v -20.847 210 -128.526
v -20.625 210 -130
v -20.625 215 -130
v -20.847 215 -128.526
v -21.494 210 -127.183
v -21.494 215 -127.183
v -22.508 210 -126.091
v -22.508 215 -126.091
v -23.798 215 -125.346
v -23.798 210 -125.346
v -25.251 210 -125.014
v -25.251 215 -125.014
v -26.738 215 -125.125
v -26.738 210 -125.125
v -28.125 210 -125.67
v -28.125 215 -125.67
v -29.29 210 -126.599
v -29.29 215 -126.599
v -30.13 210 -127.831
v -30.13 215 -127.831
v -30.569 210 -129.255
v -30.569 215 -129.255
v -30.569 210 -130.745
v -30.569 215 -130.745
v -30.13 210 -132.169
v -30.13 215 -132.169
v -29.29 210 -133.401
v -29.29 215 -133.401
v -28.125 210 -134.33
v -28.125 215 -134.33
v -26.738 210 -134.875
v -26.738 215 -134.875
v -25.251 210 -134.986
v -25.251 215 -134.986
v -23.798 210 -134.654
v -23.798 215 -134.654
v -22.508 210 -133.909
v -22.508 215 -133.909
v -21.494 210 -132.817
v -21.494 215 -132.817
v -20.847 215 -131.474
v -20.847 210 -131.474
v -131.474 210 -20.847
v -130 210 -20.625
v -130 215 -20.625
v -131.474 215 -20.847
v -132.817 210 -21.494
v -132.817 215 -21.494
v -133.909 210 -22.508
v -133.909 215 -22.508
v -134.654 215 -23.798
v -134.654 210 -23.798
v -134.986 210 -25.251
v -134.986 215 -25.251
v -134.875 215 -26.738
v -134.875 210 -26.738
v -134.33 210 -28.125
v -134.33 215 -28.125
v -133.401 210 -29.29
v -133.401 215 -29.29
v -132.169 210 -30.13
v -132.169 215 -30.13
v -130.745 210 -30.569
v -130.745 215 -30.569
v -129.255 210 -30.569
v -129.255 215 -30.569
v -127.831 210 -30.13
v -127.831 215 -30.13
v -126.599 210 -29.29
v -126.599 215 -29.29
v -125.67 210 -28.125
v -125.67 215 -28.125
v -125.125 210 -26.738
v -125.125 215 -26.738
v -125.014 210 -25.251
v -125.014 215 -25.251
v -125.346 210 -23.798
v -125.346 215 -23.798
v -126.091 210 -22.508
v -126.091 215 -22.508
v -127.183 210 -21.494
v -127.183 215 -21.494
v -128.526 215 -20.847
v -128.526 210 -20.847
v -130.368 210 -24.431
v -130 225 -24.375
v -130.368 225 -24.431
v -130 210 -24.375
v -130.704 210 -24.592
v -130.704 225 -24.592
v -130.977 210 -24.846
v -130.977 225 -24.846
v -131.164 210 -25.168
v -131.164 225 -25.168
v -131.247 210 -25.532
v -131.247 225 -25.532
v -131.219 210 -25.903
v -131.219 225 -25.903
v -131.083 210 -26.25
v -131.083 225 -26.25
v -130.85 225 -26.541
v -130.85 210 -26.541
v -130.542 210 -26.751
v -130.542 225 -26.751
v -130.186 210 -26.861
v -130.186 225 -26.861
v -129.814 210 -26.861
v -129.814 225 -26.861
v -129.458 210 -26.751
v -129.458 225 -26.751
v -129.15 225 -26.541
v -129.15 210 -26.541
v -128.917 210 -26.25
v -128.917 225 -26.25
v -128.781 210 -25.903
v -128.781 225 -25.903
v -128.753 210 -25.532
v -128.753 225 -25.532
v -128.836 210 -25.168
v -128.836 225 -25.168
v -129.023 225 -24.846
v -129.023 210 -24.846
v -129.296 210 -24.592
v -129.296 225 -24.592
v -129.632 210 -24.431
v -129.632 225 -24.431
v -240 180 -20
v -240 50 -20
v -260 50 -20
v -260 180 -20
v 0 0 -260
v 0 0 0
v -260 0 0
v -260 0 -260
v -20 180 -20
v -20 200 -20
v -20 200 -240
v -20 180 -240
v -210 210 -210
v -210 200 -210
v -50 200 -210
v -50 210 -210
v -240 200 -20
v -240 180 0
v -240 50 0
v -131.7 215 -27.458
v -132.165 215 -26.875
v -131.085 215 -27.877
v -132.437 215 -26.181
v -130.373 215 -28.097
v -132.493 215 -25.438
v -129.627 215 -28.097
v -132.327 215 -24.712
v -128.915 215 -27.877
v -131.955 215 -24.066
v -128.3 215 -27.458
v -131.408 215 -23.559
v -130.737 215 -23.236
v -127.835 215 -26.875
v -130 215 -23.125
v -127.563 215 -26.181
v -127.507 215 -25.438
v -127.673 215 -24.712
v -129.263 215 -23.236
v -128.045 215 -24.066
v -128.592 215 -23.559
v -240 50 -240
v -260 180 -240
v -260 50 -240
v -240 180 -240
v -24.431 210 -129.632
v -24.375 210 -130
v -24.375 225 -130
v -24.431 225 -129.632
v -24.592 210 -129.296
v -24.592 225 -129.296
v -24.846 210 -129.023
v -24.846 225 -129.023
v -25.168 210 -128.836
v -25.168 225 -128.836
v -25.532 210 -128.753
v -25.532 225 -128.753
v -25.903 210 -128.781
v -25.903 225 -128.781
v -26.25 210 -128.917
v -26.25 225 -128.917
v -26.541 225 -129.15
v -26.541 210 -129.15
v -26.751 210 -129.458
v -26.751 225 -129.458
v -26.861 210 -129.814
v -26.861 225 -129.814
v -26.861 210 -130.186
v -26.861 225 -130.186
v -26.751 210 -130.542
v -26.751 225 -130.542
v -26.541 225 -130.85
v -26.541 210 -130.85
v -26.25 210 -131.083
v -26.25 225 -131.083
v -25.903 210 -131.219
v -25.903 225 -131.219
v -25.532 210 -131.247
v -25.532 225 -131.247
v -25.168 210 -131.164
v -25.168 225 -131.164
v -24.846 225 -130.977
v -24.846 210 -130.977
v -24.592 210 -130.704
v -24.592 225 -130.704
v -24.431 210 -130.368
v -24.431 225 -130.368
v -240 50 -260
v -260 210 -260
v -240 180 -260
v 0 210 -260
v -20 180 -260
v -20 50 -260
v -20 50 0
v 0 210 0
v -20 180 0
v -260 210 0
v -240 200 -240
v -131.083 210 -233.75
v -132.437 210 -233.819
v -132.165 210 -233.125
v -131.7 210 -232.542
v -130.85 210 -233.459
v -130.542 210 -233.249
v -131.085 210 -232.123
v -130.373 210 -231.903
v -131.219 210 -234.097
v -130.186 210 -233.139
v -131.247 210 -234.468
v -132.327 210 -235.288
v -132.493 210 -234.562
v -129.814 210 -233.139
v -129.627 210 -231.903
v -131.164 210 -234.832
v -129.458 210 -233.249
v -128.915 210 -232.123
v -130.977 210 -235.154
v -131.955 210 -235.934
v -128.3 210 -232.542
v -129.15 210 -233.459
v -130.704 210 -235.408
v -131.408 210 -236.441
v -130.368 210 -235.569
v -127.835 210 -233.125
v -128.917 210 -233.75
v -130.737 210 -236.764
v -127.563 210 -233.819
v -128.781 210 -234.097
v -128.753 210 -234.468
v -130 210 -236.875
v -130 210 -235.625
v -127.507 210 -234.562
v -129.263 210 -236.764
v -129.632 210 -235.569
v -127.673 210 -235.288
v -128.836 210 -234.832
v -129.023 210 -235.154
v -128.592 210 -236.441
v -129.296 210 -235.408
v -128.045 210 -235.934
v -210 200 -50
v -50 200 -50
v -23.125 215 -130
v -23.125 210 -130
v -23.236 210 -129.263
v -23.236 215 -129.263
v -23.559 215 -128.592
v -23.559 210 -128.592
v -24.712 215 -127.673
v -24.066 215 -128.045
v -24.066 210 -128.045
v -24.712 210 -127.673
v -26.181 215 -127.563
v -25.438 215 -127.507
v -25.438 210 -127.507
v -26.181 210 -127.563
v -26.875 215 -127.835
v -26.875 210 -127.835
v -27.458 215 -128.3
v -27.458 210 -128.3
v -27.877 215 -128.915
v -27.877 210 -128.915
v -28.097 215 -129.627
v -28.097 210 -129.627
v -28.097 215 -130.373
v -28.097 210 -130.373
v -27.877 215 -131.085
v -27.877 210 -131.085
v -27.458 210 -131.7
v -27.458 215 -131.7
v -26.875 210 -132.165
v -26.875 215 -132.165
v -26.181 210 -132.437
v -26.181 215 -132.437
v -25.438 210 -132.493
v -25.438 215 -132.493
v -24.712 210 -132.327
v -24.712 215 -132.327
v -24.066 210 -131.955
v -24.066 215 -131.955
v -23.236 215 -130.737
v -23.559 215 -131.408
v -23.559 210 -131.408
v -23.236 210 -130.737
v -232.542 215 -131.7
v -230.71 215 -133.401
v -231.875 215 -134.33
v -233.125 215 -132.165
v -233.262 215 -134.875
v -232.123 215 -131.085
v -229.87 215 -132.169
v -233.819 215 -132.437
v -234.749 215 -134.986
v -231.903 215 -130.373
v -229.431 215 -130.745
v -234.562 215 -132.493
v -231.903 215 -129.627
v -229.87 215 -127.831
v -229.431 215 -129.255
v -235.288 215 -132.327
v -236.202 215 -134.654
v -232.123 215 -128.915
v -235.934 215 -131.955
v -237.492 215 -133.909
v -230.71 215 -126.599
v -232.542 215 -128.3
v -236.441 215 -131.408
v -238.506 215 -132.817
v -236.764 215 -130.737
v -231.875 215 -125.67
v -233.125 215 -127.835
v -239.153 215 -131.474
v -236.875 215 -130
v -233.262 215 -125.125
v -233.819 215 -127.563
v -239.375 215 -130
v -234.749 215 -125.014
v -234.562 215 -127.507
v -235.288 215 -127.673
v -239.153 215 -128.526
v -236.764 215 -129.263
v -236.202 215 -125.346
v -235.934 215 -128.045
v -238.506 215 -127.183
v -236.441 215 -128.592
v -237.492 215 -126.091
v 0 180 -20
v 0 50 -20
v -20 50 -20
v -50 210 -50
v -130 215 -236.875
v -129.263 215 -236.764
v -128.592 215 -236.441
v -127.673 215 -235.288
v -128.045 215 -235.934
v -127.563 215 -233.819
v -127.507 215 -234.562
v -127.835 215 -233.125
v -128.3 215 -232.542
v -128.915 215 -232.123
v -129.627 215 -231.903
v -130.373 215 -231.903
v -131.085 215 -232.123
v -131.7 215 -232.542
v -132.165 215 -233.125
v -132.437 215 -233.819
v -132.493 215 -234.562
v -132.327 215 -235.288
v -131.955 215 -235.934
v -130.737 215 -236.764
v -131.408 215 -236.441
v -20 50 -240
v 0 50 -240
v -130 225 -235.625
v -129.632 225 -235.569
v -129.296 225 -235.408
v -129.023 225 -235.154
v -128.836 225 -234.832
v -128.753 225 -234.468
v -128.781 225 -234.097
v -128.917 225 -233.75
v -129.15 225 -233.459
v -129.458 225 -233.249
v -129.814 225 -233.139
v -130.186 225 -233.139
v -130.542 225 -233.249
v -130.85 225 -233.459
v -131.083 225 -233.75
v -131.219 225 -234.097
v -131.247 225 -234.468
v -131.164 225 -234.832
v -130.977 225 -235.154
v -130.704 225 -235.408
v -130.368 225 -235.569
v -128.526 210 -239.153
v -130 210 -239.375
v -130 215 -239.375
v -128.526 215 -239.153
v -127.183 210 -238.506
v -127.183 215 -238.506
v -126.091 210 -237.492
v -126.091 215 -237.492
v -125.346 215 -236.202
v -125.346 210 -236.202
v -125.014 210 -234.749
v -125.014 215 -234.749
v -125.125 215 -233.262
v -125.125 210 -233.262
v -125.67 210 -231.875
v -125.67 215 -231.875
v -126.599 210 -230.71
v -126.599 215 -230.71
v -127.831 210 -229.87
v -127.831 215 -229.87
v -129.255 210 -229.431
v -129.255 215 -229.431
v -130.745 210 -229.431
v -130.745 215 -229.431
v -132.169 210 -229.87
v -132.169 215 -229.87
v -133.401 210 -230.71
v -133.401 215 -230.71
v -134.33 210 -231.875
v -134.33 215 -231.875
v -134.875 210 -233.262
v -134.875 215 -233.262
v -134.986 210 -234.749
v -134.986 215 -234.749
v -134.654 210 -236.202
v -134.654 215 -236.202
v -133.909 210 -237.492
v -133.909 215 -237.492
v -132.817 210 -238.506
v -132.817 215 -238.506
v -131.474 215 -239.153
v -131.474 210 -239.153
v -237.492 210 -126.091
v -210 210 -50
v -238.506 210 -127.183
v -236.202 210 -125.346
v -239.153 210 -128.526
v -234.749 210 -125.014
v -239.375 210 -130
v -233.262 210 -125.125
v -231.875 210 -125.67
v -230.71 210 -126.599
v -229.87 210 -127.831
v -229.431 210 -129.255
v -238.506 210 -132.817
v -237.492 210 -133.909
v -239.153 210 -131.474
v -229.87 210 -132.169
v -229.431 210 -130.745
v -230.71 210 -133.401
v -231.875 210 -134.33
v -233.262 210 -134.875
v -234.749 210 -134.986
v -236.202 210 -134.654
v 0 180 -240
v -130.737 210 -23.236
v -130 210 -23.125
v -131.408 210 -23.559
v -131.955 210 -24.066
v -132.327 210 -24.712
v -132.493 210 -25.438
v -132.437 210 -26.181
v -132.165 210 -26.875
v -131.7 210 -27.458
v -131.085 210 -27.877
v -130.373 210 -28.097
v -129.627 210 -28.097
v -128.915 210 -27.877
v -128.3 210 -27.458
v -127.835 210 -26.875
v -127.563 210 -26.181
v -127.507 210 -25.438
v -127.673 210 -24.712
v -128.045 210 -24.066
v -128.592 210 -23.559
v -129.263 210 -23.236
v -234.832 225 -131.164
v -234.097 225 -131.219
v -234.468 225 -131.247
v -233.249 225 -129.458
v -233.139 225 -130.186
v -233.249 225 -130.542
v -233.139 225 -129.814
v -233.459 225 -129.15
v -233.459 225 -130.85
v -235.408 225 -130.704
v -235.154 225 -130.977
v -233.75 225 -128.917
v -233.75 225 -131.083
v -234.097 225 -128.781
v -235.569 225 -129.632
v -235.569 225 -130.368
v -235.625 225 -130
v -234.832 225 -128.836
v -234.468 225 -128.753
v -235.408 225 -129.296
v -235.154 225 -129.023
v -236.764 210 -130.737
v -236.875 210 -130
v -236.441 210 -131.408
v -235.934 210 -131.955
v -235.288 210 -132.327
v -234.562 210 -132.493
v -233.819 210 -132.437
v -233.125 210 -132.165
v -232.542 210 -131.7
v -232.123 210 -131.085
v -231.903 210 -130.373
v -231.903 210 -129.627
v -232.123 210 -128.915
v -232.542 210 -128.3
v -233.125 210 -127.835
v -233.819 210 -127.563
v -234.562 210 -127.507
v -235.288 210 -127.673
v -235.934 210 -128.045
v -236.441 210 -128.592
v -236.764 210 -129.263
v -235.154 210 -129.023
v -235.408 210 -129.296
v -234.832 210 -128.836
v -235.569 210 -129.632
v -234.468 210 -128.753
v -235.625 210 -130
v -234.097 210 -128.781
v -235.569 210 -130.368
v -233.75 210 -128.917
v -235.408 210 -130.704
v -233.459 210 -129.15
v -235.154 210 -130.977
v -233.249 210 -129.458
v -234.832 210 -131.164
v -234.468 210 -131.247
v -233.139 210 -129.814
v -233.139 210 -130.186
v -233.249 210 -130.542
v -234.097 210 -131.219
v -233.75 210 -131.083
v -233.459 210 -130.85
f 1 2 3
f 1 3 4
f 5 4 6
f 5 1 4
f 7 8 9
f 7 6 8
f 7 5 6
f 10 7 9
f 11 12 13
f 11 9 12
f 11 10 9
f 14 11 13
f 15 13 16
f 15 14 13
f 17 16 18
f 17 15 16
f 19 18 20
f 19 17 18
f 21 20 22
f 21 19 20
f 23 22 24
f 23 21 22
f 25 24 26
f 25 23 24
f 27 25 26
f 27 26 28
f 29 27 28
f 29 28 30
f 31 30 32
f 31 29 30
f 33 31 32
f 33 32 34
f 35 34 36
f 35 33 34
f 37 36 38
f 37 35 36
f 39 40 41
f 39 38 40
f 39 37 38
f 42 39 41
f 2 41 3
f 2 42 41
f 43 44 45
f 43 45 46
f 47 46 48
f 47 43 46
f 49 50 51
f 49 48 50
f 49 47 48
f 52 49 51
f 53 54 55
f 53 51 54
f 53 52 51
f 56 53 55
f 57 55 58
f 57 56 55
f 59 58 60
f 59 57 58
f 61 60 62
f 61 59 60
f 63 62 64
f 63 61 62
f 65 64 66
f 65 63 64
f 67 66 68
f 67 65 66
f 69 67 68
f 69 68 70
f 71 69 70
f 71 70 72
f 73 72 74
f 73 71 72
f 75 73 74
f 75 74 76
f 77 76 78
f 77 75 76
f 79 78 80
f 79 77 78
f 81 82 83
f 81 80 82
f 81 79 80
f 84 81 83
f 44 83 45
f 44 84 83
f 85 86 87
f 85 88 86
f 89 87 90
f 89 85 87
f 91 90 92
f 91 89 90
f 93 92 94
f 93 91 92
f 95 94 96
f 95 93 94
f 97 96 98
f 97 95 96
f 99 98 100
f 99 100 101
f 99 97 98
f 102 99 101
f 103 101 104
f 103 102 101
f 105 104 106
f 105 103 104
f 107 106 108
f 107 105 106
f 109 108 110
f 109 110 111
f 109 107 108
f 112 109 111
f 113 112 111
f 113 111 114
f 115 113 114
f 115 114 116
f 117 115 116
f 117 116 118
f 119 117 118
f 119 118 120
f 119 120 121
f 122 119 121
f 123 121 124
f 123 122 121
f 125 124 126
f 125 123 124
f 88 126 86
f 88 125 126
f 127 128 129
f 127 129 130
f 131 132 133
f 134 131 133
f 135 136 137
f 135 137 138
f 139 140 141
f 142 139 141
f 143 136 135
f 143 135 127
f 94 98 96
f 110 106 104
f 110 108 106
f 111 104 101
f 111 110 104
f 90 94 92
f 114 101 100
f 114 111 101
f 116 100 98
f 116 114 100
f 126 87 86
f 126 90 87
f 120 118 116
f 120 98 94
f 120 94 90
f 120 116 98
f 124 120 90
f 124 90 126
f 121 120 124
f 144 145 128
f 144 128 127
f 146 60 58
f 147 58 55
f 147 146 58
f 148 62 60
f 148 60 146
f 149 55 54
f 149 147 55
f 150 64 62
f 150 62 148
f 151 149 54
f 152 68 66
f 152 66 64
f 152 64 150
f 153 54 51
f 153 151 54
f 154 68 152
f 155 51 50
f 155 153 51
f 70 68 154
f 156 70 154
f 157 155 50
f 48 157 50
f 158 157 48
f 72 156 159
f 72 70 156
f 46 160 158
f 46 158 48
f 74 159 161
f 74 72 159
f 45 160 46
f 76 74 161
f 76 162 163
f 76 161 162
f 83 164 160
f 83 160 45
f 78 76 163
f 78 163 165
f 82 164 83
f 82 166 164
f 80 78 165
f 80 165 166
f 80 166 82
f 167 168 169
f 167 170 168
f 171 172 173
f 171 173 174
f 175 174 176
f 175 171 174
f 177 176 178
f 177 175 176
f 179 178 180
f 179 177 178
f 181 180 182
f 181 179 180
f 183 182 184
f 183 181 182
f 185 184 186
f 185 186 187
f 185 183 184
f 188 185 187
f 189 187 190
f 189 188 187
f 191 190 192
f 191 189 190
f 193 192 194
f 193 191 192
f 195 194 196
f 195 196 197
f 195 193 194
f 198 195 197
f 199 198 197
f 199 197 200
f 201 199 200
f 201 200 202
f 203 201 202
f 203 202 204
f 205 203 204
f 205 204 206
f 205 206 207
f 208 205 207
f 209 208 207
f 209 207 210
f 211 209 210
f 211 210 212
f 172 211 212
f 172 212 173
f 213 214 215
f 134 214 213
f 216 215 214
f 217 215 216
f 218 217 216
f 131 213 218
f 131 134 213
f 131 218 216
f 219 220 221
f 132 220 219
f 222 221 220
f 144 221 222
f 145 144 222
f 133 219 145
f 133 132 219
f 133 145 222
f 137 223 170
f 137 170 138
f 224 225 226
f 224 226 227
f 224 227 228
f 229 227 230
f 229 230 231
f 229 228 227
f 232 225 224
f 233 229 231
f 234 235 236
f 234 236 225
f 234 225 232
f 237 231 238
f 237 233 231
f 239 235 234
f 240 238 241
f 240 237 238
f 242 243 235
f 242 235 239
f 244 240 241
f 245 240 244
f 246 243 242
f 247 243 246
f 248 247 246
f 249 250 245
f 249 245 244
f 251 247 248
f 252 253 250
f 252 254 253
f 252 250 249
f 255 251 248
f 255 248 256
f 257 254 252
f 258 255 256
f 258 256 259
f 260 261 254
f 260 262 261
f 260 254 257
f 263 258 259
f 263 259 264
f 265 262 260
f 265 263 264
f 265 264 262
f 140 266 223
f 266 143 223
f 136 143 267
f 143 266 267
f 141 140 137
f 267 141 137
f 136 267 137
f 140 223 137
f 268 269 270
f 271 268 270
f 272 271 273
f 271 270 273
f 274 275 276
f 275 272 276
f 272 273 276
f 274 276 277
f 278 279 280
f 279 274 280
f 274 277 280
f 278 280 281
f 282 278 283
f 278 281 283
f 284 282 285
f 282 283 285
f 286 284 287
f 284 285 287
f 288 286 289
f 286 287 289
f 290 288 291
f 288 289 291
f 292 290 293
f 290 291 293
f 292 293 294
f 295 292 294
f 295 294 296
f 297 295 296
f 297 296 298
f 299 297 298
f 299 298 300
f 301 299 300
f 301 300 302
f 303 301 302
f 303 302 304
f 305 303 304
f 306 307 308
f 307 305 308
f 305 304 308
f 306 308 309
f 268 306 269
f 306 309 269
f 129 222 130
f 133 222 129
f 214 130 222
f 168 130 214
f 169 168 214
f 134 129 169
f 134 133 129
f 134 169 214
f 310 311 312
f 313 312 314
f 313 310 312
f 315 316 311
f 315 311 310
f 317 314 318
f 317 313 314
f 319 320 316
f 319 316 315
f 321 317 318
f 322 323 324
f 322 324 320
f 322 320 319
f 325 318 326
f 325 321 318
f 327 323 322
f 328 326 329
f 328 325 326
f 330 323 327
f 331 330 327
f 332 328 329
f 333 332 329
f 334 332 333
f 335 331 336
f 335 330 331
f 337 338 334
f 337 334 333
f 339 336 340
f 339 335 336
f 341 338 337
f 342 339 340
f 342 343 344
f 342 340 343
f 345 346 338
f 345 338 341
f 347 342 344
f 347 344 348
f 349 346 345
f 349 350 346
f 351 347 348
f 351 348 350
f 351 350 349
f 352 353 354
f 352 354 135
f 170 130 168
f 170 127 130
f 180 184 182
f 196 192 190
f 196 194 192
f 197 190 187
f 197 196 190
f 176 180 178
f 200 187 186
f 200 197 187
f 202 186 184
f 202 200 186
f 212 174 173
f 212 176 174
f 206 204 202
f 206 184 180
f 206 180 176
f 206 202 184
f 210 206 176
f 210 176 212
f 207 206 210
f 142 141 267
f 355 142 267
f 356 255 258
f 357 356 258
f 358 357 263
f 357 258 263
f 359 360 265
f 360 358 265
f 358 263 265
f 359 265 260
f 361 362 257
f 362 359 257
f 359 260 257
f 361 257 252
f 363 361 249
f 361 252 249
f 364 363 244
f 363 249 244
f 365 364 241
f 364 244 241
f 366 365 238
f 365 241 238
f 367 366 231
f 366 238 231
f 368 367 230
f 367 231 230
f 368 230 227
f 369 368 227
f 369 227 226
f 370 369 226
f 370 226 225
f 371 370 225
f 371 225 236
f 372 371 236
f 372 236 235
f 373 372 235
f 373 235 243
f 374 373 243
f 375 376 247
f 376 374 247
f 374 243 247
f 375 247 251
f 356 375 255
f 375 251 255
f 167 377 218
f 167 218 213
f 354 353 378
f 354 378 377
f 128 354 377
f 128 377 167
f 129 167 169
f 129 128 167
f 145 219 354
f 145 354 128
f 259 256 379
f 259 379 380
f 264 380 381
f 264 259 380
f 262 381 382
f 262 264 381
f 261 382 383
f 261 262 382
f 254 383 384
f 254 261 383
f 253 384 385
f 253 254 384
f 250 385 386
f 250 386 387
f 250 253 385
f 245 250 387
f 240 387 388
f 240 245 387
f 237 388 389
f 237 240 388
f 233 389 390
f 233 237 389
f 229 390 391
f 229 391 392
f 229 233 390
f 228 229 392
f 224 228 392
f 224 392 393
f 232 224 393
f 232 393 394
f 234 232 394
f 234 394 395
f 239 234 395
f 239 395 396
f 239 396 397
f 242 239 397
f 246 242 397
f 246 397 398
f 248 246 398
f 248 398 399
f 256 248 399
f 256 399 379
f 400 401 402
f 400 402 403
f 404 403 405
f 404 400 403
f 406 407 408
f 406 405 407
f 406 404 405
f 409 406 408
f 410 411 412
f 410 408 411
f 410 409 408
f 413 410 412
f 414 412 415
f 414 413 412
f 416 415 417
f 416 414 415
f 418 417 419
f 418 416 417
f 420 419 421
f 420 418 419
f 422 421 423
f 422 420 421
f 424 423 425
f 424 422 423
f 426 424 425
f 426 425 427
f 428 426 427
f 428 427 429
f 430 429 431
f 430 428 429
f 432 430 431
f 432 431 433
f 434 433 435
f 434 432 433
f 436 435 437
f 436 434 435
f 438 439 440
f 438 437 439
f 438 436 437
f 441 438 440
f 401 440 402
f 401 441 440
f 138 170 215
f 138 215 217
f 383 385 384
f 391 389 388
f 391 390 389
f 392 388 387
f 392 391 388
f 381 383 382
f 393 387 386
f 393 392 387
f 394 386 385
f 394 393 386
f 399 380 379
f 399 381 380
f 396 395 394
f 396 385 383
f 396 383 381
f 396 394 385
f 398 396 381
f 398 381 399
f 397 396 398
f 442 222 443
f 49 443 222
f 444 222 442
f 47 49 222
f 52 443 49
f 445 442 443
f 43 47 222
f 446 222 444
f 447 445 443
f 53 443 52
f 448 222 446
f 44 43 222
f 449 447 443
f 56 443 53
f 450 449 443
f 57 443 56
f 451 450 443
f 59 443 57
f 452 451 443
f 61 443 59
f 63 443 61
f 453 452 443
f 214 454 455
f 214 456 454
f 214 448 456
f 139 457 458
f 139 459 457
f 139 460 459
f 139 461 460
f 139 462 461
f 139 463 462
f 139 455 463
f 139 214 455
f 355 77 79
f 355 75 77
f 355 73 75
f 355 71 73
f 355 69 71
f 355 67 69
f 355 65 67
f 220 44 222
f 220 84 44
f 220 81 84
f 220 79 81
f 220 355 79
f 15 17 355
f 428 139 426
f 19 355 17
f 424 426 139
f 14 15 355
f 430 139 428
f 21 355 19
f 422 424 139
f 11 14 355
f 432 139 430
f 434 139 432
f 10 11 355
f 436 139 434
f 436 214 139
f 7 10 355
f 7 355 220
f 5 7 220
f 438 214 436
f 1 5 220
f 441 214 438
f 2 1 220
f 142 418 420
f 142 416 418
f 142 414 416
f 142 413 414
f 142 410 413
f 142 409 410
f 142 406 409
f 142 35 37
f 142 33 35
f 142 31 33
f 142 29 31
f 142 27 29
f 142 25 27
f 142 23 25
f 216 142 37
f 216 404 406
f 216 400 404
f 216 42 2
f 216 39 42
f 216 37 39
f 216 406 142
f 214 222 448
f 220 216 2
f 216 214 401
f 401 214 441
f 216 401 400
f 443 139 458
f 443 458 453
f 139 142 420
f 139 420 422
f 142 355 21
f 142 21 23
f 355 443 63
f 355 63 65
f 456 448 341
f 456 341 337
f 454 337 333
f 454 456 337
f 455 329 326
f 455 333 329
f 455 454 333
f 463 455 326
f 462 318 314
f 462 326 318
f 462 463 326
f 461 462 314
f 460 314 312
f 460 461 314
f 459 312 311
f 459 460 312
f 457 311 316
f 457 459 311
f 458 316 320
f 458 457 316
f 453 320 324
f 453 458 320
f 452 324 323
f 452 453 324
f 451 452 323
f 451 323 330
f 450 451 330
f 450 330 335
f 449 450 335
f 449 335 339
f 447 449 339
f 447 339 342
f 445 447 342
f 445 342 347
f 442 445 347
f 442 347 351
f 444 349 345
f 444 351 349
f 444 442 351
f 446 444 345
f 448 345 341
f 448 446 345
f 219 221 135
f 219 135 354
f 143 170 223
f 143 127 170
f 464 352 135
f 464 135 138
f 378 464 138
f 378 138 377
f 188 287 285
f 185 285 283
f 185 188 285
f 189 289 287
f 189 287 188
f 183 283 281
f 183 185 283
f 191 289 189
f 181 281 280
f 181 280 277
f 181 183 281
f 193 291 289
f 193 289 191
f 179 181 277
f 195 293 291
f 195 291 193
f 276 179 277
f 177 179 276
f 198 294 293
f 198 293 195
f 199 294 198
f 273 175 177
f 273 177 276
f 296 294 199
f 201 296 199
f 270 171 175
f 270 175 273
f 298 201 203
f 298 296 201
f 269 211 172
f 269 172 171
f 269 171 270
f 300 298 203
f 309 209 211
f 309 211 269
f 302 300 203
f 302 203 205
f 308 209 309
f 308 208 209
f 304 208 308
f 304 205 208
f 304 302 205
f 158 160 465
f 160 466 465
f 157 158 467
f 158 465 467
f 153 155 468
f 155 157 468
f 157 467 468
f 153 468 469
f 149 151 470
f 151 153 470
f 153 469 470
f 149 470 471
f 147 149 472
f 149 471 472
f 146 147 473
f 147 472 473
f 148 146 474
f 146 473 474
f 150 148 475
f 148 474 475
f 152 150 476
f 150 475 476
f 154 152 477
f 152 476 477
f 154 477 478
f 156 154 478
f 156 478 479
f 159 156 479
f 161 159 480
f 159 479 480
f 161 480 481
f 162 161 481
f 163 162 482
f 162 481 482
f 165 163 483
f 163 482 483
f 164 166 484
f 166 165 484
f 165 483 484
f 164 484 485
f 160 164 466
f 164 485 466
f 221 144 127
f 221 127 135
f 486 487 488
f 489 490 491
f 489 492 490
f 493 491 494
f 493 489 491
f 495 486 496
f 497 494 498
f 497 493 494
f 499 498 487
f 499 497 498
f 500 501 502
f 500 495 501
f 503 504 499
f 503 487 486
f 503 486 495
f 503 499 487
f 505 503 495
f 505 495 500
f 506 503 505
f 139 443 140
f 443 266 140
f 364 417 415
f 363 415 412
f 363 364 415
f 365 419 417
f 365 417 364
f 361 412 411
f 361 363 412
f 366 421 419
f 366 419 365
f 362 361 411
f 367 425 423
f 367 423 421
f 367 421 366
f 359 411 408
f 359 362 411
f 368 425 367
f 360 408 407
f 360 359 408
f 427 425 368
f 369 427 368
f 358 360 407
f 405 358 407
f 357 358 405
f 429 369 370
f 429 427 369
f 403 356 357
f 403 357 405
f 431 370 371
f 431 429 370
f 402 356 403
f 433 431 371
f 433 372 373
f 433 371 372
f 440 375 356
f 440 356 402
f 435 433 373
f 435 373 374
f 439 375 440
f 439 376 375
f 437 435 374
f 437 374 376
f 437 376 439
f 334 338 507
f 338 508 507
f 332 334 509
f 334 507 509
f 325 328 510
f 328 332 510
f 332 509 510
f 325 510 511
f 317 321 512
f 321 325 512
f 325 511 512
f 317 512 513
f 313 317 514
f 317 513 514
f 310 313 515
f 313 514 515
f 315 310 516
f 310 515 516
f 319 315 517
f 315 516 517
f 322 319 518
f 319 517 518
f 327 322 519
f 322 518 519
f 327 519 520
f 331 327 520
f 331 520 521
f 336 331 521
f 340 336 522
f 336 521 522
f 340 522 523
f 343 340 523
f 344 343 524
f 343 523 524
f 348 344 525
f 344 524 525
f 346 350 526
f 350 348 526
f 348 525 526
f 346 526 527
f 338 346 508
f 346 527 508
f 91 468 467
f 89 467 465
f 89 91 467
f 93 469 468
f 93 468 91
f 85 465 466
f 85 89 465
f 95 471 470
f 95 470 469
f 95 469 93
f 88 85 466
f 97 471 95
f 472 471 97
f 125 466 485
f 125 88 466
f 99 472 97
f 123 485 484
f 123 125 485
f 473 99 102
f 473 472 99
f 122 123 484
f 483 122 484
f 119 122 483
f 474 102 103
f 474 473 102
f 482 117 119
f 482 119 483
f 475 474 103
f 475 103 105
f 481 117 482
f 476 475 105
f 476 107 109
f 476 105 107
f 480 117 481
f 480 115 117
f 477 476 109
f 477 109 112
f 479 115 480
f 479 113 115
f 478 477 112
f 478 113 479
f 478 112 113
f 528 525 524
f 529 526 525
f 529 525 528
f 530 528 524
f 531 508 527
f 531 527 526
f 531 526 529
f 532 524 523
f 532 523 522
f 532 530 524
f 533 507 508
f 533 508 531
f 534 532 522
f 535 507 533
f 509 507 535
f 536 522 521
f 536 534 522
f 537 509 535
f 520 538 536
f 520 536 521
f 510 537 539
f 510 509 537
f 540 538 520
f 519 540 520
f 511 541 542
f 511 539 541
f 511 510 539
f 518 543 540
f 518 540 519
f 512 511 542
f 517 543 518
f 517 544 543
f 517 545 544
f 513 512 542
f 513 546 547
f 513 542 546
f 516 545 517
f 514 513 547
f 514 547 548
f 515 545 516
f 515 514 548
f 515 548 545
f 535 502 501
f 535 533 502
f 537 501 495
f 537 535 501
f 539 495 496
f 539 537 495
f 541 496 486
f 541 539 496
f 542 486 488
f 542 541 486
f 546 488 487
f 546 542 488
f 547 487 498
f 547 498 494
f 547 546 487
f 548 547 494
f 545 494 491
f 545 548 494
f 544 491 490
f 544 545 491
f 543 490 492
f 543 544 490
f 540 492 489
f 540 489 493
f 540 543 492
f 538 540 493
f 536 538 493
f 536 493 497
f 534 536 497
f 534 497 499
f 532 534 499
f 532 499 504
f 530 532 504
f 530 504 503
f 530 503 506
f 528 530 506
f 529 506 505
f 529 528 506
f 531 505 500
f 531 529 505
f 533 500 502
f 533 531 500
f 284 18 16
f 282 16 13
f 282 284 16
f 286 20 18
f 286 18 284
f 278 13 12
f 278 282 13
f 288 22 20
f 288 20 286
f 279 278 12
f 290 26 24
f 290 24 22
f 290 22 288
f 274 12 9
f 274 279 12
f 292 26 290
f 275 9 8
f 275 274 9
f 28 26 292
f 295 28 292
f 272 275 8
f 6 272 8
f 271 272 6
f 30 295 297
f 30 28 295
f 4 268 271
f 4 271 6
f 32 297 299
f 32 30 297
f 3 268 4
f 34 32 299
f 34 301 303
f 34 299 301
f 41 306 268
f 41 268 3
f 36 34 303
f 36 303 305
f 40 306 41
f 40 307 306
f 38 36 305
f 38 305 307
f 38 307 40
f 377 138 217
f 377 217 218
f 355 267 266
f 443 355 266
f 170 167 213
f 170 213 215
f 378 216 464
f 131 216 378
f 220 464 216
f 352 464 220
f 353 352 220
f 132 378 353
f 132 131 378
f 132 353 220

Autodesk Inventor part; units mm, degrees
ref_plane "YZ Plane" through (0, 0, 0) normal (1, 0, 0) x (0, 1, 0)
ref_plane "XZ Plane" through (0, 0, 0) normal (0, 1, 0) x (-1, 0, 0)
sketch "Sketch1" plane through (0, 0, 0) normal (0, 1, 0) x (-1, 0, 0)
  line L0 (0, 0) -> (260, 0)
  line L1 (260, 0) -> (260, -260)
  line L2 (260, -260) -> (0, -260)
  line L3 (0, -260) -> (0, 0)
  dimension "d0" = 260
  dimension "d1" = 260
extrude "Extrusion1" add sketch "Sketch1" along normal blind 200
sketch "Sketch2" plane through (0, 200, 0) normal (0, 1, 0) x (1, 0, 0)
  line L0 (-260, 0) -> (0, 0) projected
  line L1 (0, 0) -> (-20, 0)
  line L2 (-20, 0) -> (-20, 20)
  line L3 (-20, 20) -> (0, 20)
  line L4 (0, 20) -> (0, 0)
  line L5 (-260, 260) -> (-260, 0) projected
  line L6 (-260, 260) -> (-240, 260)
  line L7 (-240, 260) -> (-240, 240)
  line L8 (-240, 240) -> (-260, 240)
  line L9 (-260, 240) -> (-260, 260)
  line L10 (-240, 240) -> (-20, 240)
  line L11 (-20, 240) -> (-20, 20)
  line L12 (-20, 20) -> (-240, 20)
  line L13 (-240, 20) -> (-240, 240)
  dimension "d4" = 20
  dimension "d5" = 20
  dimension "d6" = 20
  dimension "d7" = 20
sketch "Sketch3" plane through (-260, 0, 0) normal (0, 0, 1) x (1, 0, 0)
  line L0 (260, 200) -> (0, 200) projected
  line L1 (0, 200) -> (20, 200)
  line L2 (20, 200) -> (20, 180)
  line L3 (20, 180) -> (0, 180)
  line L4 (0, 180) -> (0, 200)
  line L5 (260, 0) -> (240, 0)
  line L6 (240, 0) -> (240, 50)
  line L7 (240, 50) -> (260, 50)
  line L8 (260, 50) -> (260, 0)
  line L9 (20, 180) -> (240, 180)
  line L10 (240, 180) -> (240, 50)
  line L11 (240, 50) -> (20, 50)
  line L12 (20, 50) -> (20, 180)
  dimension "d8" = 20
  dimension "d9" = 20
  dimension "d10" = 20
  dimension "d11" = 50
extrude "Extrusion2" cut sketch "Sketch2" against normal blind 150 contours L12 L13 L10 L11
extrude "Extrusion3" cut sketch "Sketch3" against normal blind 260 contours L9 L10 L11 L12
ref_plane "Work Plane1" through (0, 0, -130) normal (0, 0, 1) x (1, 0, 0)
sketch "Sketch4" plane through (0, 0, 0) normal (1, 0, 0) x (0, 0, -1)
  line L0 (260, 200) -> (0, 200)
  line L1 (0, 200) -> (20, 200)
  line L2 (20, 200) -> (20, 180)
  line L3 (20, 180) -> (0, 180)
  line L4 (0, 180) -> (0, 200)
  line L5 (260, 0) -> (240, 0)
  line L6 (240, 0) -> (240, 50)
  line L7 (240, 50) -> (260, 50)
  line L8 (260, 50) -> (260, 0)
  line L9 (20, 180) -> (240, 180)
  line L10 (240, 180) -> (240, 50)
  line L11 (240, 50) -> (20, 50)
  line L12 (20, 50) -> (20, 180)
  point P0 (0, 0)
  dimension "d17" = 20
  dimension "d18" = 20
  dimension "d19" = 20
  dimension "d20" = 50
extrude "Extrusion4" cut sketch "Sketch4" against normal blind 260 contours L9 L10 L11 L12
sketch "Sketch5" plane through (0, 200, 0) normal (0, 1, 0) x (1, 0, 0)
  line L0 (-260, 0) -> (0, 0) projected
  line L1 (-260, 260) -> (0, 260)
  line L2 (0, 260) -> (0, 0)
  line L3 (0, 0) -> (-260, 0)
  line L4 (-260, 0) -> (-260, 260)
  line L5 (-260, 260) -> (-210, 260)
  line L6 (-210, 260) -> (-210, 210)
  line L7 (-210, 210) -> (-260, 210)
  line L8 (-260, 210) -> (-260, 260)
  line L9 (0, 0) -> (-50, 0)
  line L10 (-50, 0) -> (-50, 50)
  line L11 (-50, 50) -> (0, 50)
  line L12 (0, 50) -> (0, 0)
  line L13 (-50, 50) -> (-210, 50)
  line L14 (-210, 50) -> (-210, 210)
  line L15 (-210, 210) -> (-50, 210)
  line L16 (-50, 210) -> (-50, 50)
  dimension "d23" = 50
  dimension "d24" = 50
  dimension "d25" = 50
  dimension "d26" = 50
extrude "Extrusion5" add sketch "Sketch5" along normal blind 10 contours L4 L7 L14 L13 L10 L0 | L10 L11 L2 L0 | L4 L1 L6 L7 | L16 L15 L6 L1 L2 L11
sketch "Sketch6" plane through (0, 210, 0) normal (0, 1, 0) x (1, 0, 0)
  line L0 (0, 0) -> (-130, 0)
  line L1 (-130, 0) -> (-130, 130)
  line L2 (-130, 130) -> (0, 130)
  line L3 (0, 130) -> (0, 0)
  circle A0 centre (-130, 130) radius 97.5
  circle A1 centre (-130, 130) radius 111.25
  circle A2 centre (-130, 130) radius 104.375
  circle A3 centre (-25.625, 130) radius 1.25
  dimension "d33" = 208.75
  dimension "d29" = 130
  dimension "d30" = 130
  dimension "d31" = 195
  dimension "d32" = 222.5
  dimension "d43" = 2.5
sketch "Sketch7" plane through (0, 210, 0) normal (0, 1, 0) x (1, 0, 0)
  circle A0 centre (-25.625, 130) radius 2.5 projected
  circle A1 centre (-25.625, 130) radius 5
  point P0 (0, 0)
  dimension "d37" = 10
extrude "Extrusion7" add sketch "Sketch7" along normal blind 5
sketch "Sketch8" plane through (0, 50, 0) normal (0, 1, 0) x (1, 0, 0)
  line L0 (-20, 0) -> (-240, 0) projected
  line L1 (0, 240) -> (0, 20) projected
  point P0 (0, 0)
  point P1 (-130, 0)
  point P2 (0, 130)
  point P3 (-130, 130)
extrude "Extrusion8" add sketch "Sketch6" along normal blind 15 contours A3 A2 L2 | L2 A2 A3 | A2 L2 A3 | A3 L2 A2
pattern_circular "Circular Pattern2" count 4 over 360 about axis through (-130, 50, -130) along (0, 1, 0) of "Extrusion8", "Extrusion7"
properties part number "BaseMk1"
